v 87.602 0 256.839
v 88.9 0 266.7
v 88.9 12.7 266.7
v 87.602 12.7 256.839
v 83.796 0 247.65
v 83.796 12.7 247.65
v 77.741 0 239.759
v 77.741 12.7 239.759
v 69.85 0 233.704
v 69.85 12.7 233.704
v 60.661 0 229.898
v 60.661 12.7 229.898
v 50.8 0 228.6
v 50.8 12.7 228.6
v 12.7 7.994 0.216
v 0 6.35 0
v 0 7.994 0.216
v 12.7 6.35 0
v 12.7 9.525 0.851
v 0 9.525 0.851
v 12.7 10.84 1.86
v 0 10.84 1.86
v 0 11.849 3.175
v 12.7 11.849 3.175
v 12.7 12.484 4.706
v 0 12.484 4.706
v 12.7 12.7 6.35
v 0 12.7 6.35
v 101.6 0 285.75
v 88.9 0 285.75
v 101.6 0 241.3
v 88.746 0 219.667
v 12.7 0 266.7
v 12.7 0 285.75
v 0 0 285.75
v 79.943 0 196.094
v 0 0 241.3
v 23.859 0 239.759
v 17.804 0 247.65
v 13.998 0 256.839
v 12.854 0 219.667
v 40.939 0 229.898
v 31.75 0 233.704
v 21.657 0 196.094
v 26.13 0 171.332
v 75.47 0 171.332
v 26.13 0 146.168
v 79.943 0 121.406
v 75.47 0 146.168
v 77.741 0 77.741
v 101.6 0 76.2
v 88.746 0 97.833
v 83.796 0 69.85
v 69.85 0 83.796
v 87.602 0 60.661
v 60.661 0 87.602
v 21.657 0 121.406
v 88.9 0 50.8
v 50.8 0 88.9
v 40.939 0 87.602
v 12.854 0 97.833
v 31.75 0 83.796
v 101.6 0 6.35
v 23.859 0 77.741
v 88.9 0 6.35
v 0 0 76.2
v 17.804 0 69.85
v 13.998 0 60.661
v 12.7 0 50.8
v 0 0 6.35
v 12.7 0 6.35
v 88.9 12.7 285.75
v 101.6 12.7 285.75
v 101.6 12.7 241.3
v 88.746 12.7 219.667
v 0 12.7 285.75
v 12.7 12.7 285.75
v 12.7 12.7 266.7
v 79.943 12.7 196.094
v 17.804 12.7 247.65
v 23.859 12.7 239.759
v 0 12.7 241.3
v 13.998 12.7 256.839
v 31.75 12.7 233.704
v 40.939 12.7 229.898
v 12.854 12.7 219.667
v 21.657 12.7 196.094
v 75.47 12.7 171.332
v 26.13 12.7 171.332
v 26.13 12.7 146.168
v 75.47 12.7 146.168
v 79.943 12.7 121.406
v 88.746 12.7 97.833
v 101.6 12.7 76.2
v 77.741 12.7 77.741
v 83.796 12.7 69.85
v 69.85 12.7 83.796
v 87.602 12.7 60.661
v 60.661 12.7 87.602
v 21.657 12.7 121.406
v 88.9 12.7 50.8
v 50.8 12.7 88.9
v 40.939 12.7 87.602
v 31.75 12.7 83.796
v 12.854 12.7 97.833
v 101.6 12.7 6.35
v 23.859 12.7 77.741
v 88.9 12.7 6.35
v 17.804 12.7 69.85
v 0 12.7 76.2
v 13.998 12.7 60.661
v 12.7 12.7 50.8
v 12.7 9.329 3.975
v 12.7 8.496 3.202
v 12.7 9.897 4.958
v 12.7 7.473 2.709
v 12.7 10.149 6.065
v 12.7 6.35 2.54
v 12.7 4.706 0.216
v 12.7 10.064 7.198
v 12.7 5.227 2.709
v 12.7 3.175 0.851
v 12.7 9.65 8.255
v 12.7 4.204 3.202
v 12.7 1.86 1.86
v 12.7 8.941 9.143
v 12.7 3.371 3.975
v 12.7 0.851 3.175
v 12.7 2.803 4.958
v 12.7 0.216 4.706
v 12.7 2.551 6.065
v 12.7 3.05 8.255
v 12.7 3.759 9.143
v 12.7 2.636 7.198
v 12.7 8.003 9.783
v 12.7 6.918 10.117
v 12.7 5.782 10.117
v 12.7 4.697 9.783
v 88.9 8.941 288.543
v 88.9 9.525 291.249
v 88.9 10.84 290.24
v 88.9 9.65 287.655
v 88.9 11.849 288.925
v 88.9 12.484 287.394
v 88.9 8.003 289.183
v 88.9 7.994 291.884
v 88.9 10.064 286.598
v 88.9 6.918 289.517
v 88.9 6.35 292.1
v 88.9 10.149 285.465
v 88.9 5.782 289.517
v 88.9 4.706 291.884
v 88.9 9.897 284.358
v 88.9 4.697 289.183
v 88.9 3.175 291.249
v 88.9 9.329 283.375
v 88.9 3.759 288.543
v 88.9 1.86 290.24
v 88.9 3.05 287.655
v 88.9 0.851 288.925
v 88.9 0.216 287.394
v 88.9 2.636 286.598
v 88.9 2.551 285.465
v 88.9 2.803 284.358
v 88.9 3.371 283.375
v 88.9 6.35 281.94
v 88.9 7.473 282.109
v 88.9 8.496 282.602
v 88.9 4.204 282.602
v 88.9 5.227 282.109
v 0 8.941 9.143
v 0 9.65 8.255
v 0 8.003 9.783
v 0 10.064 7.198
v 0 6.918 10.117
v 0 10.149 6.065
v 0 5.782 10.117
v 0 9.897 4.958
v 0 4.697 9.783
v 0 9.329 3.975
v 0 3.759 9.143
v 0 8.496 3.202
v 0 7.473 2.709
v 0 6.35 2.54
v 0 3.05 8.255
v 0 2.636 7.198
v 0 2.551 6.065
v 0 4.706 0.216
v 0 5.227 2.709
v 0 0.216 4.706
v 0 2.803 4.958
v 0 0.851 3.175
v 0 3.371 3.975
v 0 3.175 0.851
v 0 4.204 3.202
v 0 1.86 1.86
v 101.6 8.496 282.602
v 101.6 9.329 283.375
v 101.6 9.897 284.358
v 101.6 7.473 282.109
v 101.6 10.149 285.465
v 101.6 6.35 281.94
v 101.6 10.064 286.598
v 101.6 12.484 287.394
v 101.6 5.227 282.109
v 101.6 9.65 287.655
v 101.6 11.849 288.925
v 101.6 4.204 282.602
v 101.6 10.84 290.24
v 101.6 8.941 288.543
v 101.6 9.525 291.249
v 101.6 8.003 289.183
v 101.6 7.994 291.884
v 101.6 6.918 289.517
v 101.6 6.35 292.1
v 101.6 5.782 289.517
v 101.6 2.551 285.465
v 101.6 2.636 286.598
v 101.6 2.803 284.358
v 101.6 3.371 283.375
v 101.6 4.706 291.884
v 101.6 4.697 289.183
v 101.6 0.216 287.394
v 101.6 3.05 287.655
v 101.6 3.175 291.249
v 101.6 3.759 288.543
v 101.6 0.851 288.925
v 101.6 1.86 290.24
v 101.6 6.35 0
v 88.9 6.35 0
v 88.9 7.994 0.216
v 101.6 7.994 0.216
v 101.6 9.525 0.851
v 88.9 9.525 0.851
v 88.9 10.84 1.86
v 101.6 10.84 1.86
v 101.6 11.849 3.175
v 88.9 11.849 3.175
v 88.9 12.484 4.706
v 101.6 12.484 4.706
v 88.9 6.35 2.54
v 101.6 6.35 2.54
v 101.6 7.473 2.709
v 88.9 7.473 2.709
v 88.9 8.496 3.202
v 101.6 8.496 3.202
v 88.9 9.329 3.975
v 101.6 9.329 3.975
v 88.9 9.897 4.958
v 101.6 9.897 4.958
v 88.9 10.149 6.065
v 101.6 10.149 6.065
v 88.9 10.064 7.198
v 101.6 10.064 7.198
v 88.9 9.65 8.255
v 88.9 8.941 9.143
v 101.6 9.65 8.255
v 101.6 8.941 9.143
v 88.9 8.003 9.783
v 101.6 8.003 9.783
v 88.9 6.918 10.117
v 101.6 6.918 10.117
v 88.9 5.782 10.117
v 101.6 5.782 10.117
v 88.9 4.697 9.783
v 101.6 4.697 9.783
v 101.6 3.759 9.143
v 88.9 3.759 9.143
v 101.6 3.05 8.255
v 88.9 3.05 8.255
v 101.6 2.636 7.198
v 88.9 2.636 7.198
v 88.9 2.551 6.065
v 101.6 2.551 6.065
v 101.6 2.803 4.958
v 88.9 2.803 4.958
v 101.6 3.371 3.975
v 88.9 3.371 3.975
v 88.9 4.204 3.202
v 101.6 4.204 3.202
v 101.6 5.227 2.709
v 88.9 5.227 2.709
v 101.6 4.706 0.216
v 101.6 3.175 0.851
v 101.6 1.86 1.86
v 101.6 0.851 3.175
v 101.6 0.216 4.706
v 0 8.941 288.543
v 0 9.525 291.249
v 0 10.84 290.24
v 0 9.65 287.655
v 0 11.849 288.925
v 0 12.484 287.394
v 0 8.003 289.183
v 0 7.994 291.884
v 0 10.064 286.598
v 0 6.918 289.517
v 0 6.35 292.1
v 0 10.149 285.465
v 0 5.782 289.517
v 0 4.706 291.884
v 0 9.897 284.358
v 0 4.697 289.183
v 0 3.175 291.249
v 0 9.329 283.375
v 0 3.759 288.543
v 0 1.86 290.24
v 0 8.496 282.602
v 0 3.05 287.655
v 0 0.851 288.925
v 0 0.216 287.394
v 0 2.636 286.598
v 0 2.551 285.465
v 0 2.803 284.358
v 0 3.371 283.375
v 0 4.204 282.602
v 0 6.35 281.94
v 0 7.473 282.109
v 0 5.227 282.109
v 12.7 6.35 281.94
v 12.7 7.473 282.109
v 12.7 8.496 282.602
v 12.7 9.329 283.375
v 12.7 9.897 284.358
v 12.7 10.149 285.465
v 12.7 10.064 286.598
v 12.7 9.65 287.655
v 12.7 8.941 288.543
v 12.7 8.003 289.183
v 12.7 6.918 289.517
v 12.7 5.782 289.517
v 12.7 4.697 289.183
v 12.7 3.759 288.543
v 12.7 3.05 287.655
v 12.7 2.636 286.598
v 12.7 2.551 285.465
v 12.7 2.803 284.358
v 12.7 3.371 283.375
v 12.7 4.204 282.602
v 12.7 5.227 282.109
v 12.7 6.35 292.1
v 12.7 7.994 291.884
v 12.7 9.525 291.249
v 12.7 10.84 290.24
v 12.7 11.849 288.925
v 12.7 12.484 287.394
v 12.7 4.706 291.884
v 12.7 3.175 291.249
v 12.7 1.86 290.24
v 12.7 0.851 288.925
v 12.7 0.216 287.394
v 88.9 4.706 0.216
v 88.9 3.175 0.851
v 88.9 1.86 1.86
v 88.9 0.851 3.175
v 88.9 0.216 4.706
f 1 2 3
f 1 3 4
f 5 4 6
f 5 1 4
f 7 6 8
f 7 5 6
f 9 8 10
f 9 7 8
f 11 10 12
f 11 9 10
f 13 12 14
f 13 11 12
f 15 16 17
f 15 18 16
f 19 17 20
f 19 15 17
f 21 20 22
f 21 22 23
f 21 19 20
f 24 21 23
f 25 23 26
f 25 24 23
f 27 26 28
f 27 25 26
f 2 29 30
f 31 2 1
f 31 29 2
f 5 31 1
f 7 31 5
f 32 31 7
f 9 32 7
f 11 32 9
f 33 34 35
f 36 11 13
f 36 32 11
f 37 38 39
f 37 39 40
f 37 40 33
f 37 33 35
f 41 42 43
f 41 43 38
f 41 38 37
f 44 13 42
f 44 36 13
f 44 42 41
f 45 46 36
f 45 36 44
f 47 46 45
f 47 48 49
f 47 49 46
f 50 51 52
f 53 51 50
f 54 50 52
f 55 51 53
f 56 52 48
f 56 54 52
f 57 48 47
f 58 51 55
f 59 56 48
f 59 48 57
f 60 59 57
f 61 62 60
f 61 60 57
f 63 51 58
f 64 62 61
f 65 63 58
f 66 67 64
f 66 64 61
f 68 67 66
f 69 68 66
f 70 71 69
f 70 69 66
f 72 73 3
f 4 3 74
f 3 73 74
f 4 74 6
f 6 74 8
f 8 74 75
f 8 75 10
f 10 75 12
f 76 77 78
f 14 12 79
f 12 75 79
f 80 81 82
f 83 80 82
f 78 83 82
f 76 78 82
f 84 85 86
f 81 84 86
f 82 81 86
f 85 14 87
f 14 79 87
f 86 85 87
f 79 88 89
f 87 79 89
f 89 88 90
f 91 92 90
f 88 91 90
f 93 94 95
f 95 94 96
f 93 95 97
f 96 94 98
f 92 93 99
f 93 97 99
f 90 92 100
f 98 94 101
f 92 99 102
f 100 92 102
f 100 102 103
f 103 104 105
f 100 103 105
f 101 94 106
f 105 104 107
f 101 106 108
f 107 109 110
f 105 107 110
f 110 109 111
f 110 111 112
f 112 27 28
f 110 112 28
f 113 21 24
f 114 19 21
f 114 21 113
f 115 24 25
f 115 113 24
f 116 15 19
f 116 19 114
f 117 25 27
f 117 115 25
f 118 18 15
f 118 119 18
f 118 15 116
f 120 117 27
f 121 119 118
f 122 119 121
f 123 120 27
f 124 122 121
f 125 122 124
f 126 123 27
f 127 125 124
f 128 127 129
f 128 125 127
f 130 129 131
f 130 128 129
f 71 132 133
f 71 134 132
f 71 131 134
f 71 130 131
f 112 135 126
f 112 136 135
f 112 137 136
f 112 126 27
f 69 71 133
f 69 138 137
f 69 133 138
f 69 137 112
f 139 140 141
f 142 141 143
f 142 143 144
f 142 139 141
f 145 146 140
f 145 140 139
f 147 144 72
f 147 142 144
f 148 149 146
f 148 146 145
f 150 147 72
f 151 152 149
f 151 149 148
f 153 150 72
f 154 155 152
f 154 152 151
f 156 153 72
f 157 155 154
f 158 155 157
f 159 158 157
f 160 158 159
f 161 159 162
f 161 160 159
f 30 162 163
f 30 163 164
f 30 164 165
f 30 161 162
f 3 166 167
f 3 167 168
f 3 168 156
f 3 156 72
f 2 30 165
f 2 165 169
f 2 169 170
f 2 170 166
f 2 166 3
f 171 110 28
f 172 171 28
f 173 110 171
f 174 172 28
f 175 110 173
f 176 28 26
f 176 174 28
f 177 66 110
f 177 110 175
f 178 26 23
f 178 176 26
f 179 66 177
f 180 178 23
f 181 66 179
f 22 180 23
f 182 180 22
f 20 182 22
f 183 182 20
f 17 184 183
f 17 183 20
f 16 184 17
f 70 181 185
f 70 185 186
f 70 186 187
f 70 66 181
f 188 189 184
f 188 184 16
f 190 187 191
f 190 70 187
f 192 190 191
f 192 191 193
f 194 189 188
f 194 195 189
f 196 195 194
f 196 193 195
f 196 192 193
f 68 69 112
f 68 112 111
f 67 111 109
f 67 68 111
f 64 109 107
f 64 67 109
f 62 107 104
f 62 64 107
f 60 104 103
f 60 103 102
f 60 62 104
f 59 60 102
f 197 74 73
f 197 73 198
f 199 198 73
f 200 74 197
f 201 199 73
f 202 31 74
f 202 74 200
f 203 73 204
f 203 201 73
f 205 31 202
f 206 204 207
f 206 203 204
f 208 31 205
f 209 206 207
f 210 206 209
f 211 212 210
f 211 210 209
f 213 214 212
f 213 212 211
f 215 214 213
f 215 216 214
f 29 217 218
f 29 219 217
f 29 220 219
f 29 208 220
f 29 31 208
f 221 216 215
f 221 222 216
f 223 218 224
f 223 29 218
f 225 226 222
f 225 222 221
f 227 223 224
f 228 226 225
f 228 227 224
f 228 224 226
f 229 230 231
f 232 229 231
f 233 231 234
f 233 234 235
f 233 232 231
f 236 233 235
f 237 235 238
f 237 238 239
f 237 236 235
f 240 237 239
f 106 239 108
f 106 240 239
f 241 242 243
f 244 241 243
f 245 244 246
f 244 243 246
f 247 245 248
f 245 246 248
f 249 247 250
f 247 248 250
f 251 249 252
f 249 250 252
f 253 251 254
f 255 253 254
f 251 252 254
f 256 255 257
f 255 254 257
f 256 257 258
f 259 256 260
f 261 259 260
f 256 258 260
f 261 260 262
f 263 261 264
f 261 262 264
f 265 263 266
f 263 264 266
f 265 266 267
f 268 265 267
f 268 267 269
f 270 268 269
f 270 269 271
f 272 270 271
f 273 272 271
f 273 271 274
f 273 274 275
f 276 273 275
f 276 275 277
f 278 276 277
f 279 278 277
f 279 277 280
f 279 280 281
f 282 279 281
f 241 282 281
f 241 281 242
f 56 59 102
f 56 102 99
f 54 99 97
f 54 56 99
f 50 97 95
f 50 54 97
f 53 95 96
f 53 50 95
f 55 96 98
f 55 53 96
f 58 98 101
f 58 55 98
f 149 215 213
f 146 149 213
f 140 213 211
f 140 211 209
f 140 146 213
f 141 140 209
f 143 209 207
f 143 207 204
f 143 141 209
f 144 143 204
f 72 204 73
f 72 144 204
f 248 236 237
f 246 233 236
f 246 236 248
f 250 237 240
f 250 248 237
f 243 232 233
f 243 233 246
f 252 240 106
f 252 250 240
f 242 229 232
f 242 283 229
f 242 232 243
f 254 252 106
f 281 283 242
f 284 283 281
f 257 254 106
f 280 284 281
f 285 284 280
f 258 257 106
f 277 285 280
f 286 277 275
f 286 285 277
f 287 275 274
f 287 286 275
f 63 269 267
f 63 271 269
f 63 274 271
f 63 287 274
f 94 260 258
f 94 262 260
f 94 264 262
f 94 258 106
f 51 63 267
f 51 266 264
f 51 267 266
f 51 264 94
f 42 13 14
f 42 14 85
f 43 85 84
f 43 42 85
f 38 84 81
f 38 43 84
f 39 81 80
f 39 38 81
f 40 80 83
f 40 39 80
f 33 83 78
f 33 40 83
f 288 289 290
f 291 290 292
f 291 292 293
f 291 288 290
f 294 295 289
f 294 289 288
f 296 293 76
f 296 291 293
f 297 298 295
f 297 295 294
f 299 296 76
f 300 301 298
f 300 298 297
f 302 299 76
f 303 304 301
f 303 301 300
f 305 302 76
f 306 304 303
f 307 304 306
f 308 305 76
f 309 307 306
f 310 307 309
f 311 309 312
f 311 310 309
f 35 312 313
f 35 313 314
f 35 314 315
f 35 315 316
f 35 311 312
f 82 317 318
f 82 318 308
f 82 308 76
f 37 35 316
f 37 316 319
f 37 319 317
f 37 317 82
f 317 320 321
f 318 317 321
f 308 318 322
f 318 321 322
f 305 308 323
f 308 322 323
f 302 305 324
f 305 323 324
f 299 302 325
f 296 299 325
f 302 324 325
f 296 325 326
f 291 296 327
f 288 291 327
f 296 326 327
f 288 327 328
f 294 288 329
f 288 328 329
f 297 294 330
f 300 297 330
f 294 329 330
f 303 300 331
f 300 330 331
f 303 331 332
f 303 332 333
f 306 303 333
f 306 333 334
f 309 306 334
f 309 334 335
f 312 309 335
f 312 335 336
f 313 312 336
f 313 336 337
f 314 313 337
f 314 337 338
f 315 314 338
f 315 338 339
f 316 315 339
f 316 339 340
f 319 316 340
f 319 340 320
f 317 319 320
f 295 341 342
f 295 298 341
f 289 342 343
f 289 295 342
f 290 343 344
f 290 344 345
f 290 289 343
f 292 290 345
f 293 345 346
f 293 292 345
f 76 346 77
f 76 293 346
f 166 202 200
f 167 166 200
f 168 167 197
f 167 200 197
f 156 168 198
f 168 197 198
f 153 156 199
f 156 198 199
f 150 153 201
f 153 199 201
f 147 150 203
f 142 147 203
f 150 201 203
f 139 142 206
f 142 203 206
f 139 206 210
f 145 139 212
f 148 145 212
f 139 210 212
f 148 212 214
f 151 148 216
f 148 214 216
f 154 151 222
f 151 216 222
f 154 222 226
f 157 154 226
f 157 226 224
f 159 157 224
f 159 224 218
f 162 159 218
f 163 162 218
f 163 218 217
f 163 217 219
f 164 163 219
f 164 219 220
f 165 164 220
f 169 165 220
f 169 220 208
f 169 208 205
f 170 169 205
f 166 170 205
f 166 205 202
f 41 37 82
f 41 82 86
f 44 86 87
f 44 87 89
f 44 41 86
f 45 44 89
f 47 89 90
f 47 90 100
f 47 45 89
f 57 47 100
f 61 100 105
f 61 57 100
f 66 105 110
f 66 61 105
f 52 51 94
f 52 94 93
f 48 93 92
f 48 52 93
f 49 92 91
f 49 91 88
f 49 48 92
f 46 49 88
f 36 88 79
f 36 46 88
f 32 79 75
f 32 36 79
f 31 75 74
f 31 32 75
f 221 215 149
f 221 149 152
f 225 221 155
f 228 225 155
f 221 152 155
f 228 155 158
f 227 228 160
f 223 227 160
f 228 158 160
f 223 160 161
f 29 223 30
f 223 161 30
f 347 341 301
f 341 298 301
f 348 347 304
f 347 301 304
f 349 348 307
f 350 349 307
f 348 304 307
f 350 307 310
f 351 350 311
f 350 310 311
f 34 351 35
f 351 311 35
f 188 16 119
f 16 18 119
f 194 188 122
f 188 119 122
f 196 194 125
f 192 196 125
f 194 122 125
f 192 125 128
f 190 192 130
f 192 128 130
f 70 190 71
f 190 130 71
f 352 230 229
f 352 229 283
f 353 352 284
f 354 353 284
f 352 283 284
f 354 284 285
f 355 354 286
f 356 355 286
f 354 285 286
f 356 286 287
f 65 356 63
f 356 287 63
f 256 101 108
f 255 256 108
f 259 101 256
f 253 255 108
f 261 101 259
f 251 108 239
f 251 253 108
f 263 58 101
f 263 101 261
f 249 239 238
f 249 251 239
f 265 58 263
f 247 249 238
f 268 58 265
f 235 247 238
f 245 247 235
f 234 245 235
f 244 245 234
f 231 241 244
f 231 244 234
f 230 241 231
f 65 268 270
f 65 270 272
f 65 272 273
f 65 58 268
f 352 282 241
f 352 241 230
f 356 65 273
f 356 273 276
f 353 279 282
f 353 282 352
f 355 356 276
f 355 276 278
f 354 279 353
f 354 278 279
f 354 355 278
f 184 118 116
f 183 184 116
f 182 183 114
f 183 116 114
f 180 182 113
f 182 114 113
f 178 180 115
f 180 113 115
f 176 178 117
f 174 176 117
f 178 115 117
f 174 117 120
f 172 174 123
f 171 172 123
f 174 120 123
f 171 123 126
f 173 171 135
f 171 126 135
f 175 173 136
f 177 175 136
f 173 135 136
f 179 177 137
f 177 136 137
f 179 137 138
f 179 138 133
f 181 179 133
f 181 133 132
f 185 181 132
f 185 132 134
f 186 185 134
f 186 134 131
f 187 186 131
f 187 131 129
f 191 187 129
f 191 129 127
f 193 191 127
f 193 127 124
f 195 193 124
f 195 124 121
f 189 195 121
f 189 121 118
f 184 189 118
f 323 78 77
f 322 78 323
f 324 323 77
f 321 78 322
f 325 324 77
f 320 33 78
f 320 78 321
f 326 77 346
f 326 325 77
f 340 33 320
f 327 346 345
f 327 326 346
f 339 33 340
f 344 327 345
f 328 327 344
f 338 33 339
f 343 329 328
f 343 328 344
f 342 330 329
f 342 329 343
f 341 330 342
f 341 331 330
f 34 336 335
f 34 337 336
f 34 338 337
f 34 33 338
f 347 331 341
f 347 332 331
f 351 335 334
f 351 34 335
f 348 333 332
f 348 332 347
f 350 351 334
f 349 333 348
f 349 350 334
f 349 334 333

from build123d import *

# Parameters (mm, degrees)
BOSS_EXTRUDE1_DEPTH = 12.7
FILLET1_R           = 6.35
SKETCH2_R           = 3.81
CUT_EXTRUDE1_DEPTH  = 310.525863217
SKETCH3_R           = 3.81
CUT_EXTRUDE2_DEPTH  = 310.525863217


with BuildPart() as part:
    # Sketch1 → Boss-Extrude1 (new body)
    with BuildSketch(Plane(origin=(0, 0, 0), x_dir=(1, 0, 0), z_dir=(0, 1, 0))):
        with BuildLine():
            Line((0, 0), (12.7, 0))
            Line((12.7, 0), (12.7, -50.8))
            ThreePointArc((12.7, -50.8), (23.859231637, -77.740768363), (50.8, -88.9))
            ThreePointArc((50.8, -88.9), (77.740768363, -77.740768363), (88.9, -50.8))
            Line((88.9, -50.8), (88.9, 0))
            Line((88.9, 0), (101.6, 0))
            Line((101.6, 0), (101.6, -76.2))
            ThreePointArc((101.6, -76.2), (74.907118974, -158.75), (101.6, -241.3))
            Line((101.6, -241.3), (101.6, -292.1))
            Line((101.6, -292.1), (88.9, -292.1))
            Line((88.9, -292.1), (88.9, -266.7))
            ThreePointArc((88.9, -266.7), (77.740768363, -239.759231637), (50.8, -228.6))
            ThreePointArc((50.8, -228.6), (23.859231637, -239.759231637), (12.7, -266.7))
            Line((12.7, -266.7), (12.7, -292.1))
            Line((12.7, -292.1), (0, -292.1))
            Line((0, -292.1), (0, -241.3))
            ThreePointArc((0, -241.3), (26.692881026, -158.75), (0, -76.2))
            Line((0, -76.2), (0, 0))
        make_face()
    extrude(amount=BOSS_EXTRUDE1_DEPTH)

    # Fillet1
    fillet1_edges = [part.edges().sort_by_distance(p)[0] for p in [
        (95.25, 0, 0),
        (6.35, 0, 0),
        (95.25, 12.7, 0),
        (6.35, 12.7, 0),
        (6.35, 0, 292.1),
        (6.35, 12.7, 292.1),
        (95.25, 0, 292.1),
        (95.25, 12.7, 292.1),
    ]]
    fillet(fillet1_edges, radius=FILLET1_R - 0.0001)  # a hair under: the kernel refuses the full size

    # Sketch2 → Cut-Extrude1 (cut, through all)
    with BuildSketch(Plane(origin=(101.6, 0, 0), x_dir=(0, 0, -1), z_dir=(1, 0, 0))):
        with Locations((-285.75, 6.35)):
            Circle(SKETCH2_R)
    extrude(amount=-CUT_EXTRUDE1_DEPTH, mode=Mode.SUBTRACT)

    # Sketch3 → Cut-Extrude2 (cut, through all)
    with BuildSketch(Plane(origin=(101.6, 0, 0), x_dir=(0, 0, -1), z_dir=(1, 0, 0))):
        with Locations((-6.35, 6.35)):
            Circle(SKETCH3_R)
    extrude(amount=-CUT_EXTRUDE2_DEPTH, mode=Mode.SUBTRACT)


solid = part.part
